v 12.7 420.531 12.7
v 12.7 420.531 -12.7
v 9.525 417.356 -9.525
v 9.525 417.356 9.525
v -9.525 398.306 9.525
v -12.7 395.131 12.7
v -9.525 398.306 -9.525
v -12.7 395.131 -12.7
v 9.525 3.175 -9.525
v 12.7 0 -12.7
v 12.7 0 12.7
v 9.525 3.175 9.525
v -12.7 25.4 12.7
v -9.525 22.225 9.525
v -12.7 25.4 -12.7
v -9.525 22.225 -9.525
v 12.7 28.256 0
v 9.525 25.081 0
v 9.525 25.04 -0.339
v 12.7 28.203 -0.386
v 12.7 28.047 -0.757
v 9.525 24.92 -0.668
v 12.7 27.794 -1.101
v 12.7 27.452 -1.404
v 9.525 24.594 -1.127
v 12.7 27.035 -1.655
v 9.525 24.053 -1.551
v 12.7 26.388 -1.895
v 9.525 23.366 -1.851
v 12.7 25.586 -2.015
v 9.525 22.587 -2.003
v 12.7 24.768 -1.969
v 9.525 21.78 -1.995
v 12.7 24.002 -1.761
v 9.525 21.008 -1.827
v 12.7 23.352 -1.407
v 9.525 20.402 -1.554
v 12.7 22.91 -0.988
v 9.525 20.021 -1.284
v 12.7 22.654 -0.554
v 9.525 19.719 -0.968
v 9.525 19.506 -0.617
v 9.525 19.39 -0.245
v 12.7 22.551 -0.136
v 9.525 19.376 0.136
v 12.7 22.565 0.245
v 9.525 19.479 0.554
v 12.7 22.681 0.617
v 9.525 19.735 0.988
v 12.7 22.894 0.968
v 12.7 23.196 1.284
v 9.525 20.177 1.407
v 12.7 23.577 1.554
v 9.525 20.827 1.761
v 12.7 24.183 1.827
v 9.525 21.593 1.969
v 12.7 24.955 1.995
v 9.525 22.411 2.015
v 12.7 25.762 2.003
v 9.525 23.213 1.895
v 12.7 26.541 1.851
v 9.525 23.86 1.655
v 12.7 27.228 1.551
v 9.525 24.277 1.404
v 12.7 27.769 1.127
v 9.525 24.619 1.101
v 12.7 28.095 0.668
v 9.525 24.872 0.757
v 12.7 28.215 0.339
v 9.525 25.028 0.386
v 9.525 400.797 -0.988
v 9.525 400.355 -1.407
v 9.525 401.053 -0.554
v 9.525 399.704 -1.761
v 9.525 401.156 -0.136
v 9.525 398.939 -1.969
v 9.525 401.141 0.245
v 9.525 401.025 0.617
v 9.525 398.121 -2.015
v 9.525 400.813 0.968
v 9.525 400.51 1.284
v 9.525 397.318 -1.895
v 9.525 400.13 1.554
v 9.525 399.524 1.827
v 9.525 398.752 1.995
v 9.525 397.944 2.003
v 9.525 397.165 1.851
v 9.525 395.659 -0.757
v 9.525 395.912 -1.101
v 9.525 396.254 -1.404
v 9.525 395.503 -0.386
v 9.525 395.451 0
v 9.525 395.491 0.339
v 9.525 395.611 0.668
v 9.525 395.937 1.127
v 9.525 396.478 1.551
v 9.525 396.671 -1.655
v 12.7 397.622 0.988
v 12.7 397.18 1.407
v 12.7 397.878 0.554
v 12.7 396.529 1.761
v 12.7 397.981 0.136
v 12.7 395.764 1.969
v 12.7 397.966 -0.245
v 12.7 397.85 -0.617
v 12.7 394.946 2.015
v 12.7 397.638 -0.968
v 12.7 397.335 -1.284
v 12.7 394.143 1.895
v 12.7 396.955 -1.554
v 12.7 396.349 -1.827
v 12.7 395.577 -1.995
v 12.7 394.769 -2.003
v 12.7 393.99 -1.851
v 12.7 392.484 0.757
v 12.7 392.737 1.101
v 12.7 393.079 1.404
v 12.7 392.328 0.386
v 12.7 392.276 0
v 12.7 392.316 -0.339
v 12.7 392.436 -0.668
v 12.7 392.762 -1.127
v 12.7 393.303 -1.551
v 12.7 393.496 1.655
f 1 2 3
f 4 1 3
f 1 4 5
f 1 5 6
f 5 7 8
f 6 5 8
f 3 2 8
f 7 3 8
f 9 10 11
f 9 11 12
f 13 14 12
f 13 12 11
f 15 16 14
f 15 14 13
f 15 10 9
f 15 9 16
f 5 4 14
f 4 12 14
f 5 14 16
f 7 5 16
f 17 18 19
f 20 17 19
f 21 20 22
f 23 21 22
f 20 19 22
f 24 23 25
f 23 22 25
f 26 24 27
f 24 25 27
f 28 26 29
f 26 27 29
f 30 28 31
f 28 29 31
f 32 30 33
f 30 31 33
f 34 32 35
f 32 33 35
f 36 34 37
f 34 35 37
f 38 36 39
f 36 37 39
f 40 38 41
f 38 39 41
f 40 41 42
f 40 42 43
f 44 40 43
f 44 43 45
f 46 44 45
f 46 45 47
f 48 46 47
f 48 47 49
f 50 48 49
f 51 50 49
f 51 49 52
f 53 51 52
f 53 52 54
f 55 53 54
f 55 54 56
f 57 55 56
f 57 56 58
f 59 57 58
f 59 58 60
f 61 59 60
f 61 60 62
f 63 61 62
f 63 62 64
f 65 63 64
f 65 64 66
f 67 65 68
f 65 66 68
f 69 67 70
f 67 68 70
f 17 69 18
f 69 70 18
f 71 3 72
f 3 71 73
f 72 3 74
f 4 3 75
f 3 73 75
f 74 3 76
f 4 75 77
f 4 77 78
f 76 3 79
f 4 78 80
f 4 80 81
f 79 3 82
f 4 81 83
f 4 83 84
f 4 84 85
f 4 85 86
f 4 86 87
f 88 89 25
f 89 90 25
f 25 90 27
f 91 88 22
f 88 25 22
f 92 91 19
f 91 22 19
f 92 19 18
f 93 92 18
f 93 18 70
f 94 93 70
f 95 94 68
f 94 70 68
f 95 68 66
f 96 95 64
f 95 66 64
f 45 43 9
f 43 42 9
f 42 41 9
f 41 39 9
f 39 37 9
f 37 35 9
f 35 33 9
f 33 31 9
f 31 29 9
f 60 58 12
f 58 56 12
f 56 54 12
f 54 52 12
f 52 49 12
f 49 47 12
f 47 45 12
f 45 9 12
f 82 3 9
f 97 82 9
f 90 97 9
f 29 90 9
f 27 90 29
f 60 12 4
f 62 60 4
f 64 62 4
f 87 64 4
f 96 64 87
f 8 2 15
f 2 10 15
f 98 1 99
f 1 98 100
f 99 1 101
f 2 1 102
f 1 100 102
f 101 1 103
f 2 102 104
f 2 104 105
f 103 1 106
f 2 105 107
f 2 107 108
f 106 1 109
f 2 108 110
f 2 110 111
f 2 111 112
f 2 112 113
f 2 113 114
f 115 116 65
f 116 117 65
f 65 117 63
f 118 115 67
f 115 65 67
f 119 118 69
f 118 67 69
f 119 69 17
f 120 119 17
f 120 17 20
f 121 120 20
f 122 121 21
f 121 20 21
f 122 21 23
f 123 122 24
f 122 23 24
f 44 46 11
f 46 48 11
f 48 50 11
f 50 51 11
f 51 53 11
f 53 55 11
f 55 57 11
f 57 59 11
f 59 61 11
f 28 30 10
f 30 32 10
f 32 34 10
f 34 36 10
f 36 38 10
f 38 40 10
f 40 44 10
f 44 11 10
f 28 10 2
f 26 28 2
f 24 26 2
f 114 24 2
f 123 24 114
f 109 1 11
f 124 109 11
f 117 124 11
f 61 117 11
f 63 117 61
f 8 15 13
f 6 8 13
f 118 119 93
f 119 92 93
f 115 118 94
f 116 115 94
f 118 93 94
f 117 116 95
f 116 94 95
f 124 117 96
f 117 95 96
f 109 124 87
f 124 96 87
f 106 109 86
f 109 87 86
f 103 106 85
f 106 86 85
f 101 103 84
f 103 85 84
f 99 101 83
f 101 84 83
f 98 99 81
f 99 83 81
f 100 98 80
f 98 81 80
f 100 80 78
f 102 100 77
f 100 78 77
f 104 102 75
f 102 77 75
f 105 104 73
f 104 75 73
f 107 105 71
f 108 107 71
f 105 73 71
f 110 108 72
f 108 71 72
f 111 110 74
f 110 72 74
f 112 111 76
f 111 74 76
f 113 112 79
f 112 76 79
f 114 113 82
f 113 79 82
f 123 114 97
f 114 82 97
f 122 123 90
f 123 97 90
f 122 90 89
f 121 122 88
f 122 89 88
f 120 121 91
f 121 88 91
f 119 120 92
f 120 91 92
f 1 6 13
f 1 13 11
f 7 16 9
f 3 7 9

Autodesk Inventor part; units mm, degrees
ref_plane "YZ Plane" through (0, 0, 0) normal (1, 0, 0) x (0, 1, 0)
ref_plane "XZ Plane" through (0, 0, 0) normal (0, 1, 0) x (-1, 0, 0)
ref_plane "XY Plane" through (0, 0, 0) normal (0, 0, 1) x (1, 0, 0)
sketch "Sketch1" plane through (0, 0, 0) normal (0, 1, 0) x (-1, 0, 0)
  line L0 (-12.7, -12.7) -> (12.7, -12.7)
  line L1 (12.7, -12.7) -> (12.7, 12.7)
  line L2 (12.7, 12.7) -> (-12.7, 12.7)
  line L3 (-12.7, 12.7) -> (-12.7, -12.7)
  line L4 (-12.7, -12.7) -> (12.7, 12.7) construction
  line L5 (12.7, -12.7) -> (-12.7, 12.7) construction
  line L6 (9.525, 9.525) -> (9.525, -9.525)
  line L7 (9.525, -9.525) -> (-9.525, -9.525)
  line L8 (-9.525, -9.525) -> (-9.525, 9.525)
  line L9 (-9.525, 9.525) -> (9.525, 9.525)
  point P0 (0, 0)
  dimension "d0" = 25.4
  dimension "d1" = 25.4
  dimension "d2" = 3.175
extrude "Extrusion1" add sketch "Sketch1" along normal blind 420.5313
sketch "Sketch2" plane through (12.7, 0, -12.7) normal (0, 0, -1) x (-1, 0, 0)
  line L0 (0, 0) -> (25.4, 25.4)
  line L1 (25.4, 0) -> (25.4, 420.5313) projected
  line L2 (0, 0) -> (25.4, 0) projected
  line L3 (25.4, 0) -> (25.4, 420.5313) projected
  line L4 (0, 420.5313) -> (25.4, 420.5313) projected
  line L5 (0, 0) -> (0, 420.5313) projected
  line L6 (0, 420.5313) -> (25.4, 395.1313)
  point P0 (12.7, 0)
  dimension "d5" = 25.4
  dimension "d6" = 25.4
extrude "Extrusion2" cut sketch "Sketch2" against normal blind 451.1802 contours L0 L1 L2 | L4 L1 L6
sketch "Sketch3" plane through (12.7, 0, 12.7) normal (-0.7071, -0.7071, 0) x (-0.7071, 0.7071, 0)
  line L0 (35.921, 0) -> (0, 0) projected
  line L1 (35.921, 25.4) -> (35.921, 0) projected
  line L2 (0, 25.4) -> (35.921, 25.4) projected
  line L3 (0, 0) -> (0, 25.4) projected
  line L4 (4.4901, 3.175) -> (31.4309, 3.175) projected
  line L5 (4.4901, 22.225) -> (4.4901, 3.175) projected
  line L6 (31.4309, 22.225) -> (4.4901, 22.225) projected
  line L7 (31.4309, 3.175) -> (31.4309, 22.225) projected
  line L8 (35.921, 0) -> (297.3605, 0) projected
  line L9 (35.921, 0) -> (0, 25.4)
  line L10 (35.921, 25.4) -> (0, 0)
  circle A0 centre (17.9605, 12.7) radius 2.0193
  point P0 (8.9803, 12.7)
  dimension "d9" = 4.0386
extrude "Extrusion3" cut sketch "Sketch3" against normal through all contours A0 L10 L9 | L9 L10 A0 | A0 L9 L10 | L10 L9 A0
sketch "Sketch4" plane through (12.7, 420.5313, -12.7) normal (-0.7071, 0.7071, 0) x (-0.7071, -0.7071, 0)
  line L0 (0, 25.4) -> (35.921, 25.4) construction
  line L1 (0, 25.4) -> (0, 0) construction
  line L2 (35.921, 0) -> (0, 0) construction
  line L3 (35.921, 25.4) -> (35.921, 0) construction
  line L4 (31.4309, 22.225) -> (4.4901, 22.225) construction
  line L5 (31.4309, 3.175) -> (31.4309, 22.225) construction
  line L6 (4.4901, 3.175) -> (31.4309, 3.175) construction
  line L7 (4.4901, 22.225) -> (4.4901, 3.175) construction
  line L8 (0, 0) -> (35.921, 25.4) construction
  line L9 (35.921, 0) -> (0, 25.4) construction
  circle A0 centre (17.9605, 12.7) radius 2.0193
  point P0 (306.3408, 12.7)
  dimension "d12" = 4.0386
extrude "Extrusion4" cut sketch "Sketch4" against normal through all
thread "Thread1" size "10-32 UNF" class "2B" standard "ANSI Unified Screw Threads" full length
thread "Thread2" size "10-32 UNF" class "2B" standard "ANSI Unified Screw Threads" full length
properties part number "STRU_010_BilletCrossbar_17.7in_Angled" material "Aluminum 6061"
